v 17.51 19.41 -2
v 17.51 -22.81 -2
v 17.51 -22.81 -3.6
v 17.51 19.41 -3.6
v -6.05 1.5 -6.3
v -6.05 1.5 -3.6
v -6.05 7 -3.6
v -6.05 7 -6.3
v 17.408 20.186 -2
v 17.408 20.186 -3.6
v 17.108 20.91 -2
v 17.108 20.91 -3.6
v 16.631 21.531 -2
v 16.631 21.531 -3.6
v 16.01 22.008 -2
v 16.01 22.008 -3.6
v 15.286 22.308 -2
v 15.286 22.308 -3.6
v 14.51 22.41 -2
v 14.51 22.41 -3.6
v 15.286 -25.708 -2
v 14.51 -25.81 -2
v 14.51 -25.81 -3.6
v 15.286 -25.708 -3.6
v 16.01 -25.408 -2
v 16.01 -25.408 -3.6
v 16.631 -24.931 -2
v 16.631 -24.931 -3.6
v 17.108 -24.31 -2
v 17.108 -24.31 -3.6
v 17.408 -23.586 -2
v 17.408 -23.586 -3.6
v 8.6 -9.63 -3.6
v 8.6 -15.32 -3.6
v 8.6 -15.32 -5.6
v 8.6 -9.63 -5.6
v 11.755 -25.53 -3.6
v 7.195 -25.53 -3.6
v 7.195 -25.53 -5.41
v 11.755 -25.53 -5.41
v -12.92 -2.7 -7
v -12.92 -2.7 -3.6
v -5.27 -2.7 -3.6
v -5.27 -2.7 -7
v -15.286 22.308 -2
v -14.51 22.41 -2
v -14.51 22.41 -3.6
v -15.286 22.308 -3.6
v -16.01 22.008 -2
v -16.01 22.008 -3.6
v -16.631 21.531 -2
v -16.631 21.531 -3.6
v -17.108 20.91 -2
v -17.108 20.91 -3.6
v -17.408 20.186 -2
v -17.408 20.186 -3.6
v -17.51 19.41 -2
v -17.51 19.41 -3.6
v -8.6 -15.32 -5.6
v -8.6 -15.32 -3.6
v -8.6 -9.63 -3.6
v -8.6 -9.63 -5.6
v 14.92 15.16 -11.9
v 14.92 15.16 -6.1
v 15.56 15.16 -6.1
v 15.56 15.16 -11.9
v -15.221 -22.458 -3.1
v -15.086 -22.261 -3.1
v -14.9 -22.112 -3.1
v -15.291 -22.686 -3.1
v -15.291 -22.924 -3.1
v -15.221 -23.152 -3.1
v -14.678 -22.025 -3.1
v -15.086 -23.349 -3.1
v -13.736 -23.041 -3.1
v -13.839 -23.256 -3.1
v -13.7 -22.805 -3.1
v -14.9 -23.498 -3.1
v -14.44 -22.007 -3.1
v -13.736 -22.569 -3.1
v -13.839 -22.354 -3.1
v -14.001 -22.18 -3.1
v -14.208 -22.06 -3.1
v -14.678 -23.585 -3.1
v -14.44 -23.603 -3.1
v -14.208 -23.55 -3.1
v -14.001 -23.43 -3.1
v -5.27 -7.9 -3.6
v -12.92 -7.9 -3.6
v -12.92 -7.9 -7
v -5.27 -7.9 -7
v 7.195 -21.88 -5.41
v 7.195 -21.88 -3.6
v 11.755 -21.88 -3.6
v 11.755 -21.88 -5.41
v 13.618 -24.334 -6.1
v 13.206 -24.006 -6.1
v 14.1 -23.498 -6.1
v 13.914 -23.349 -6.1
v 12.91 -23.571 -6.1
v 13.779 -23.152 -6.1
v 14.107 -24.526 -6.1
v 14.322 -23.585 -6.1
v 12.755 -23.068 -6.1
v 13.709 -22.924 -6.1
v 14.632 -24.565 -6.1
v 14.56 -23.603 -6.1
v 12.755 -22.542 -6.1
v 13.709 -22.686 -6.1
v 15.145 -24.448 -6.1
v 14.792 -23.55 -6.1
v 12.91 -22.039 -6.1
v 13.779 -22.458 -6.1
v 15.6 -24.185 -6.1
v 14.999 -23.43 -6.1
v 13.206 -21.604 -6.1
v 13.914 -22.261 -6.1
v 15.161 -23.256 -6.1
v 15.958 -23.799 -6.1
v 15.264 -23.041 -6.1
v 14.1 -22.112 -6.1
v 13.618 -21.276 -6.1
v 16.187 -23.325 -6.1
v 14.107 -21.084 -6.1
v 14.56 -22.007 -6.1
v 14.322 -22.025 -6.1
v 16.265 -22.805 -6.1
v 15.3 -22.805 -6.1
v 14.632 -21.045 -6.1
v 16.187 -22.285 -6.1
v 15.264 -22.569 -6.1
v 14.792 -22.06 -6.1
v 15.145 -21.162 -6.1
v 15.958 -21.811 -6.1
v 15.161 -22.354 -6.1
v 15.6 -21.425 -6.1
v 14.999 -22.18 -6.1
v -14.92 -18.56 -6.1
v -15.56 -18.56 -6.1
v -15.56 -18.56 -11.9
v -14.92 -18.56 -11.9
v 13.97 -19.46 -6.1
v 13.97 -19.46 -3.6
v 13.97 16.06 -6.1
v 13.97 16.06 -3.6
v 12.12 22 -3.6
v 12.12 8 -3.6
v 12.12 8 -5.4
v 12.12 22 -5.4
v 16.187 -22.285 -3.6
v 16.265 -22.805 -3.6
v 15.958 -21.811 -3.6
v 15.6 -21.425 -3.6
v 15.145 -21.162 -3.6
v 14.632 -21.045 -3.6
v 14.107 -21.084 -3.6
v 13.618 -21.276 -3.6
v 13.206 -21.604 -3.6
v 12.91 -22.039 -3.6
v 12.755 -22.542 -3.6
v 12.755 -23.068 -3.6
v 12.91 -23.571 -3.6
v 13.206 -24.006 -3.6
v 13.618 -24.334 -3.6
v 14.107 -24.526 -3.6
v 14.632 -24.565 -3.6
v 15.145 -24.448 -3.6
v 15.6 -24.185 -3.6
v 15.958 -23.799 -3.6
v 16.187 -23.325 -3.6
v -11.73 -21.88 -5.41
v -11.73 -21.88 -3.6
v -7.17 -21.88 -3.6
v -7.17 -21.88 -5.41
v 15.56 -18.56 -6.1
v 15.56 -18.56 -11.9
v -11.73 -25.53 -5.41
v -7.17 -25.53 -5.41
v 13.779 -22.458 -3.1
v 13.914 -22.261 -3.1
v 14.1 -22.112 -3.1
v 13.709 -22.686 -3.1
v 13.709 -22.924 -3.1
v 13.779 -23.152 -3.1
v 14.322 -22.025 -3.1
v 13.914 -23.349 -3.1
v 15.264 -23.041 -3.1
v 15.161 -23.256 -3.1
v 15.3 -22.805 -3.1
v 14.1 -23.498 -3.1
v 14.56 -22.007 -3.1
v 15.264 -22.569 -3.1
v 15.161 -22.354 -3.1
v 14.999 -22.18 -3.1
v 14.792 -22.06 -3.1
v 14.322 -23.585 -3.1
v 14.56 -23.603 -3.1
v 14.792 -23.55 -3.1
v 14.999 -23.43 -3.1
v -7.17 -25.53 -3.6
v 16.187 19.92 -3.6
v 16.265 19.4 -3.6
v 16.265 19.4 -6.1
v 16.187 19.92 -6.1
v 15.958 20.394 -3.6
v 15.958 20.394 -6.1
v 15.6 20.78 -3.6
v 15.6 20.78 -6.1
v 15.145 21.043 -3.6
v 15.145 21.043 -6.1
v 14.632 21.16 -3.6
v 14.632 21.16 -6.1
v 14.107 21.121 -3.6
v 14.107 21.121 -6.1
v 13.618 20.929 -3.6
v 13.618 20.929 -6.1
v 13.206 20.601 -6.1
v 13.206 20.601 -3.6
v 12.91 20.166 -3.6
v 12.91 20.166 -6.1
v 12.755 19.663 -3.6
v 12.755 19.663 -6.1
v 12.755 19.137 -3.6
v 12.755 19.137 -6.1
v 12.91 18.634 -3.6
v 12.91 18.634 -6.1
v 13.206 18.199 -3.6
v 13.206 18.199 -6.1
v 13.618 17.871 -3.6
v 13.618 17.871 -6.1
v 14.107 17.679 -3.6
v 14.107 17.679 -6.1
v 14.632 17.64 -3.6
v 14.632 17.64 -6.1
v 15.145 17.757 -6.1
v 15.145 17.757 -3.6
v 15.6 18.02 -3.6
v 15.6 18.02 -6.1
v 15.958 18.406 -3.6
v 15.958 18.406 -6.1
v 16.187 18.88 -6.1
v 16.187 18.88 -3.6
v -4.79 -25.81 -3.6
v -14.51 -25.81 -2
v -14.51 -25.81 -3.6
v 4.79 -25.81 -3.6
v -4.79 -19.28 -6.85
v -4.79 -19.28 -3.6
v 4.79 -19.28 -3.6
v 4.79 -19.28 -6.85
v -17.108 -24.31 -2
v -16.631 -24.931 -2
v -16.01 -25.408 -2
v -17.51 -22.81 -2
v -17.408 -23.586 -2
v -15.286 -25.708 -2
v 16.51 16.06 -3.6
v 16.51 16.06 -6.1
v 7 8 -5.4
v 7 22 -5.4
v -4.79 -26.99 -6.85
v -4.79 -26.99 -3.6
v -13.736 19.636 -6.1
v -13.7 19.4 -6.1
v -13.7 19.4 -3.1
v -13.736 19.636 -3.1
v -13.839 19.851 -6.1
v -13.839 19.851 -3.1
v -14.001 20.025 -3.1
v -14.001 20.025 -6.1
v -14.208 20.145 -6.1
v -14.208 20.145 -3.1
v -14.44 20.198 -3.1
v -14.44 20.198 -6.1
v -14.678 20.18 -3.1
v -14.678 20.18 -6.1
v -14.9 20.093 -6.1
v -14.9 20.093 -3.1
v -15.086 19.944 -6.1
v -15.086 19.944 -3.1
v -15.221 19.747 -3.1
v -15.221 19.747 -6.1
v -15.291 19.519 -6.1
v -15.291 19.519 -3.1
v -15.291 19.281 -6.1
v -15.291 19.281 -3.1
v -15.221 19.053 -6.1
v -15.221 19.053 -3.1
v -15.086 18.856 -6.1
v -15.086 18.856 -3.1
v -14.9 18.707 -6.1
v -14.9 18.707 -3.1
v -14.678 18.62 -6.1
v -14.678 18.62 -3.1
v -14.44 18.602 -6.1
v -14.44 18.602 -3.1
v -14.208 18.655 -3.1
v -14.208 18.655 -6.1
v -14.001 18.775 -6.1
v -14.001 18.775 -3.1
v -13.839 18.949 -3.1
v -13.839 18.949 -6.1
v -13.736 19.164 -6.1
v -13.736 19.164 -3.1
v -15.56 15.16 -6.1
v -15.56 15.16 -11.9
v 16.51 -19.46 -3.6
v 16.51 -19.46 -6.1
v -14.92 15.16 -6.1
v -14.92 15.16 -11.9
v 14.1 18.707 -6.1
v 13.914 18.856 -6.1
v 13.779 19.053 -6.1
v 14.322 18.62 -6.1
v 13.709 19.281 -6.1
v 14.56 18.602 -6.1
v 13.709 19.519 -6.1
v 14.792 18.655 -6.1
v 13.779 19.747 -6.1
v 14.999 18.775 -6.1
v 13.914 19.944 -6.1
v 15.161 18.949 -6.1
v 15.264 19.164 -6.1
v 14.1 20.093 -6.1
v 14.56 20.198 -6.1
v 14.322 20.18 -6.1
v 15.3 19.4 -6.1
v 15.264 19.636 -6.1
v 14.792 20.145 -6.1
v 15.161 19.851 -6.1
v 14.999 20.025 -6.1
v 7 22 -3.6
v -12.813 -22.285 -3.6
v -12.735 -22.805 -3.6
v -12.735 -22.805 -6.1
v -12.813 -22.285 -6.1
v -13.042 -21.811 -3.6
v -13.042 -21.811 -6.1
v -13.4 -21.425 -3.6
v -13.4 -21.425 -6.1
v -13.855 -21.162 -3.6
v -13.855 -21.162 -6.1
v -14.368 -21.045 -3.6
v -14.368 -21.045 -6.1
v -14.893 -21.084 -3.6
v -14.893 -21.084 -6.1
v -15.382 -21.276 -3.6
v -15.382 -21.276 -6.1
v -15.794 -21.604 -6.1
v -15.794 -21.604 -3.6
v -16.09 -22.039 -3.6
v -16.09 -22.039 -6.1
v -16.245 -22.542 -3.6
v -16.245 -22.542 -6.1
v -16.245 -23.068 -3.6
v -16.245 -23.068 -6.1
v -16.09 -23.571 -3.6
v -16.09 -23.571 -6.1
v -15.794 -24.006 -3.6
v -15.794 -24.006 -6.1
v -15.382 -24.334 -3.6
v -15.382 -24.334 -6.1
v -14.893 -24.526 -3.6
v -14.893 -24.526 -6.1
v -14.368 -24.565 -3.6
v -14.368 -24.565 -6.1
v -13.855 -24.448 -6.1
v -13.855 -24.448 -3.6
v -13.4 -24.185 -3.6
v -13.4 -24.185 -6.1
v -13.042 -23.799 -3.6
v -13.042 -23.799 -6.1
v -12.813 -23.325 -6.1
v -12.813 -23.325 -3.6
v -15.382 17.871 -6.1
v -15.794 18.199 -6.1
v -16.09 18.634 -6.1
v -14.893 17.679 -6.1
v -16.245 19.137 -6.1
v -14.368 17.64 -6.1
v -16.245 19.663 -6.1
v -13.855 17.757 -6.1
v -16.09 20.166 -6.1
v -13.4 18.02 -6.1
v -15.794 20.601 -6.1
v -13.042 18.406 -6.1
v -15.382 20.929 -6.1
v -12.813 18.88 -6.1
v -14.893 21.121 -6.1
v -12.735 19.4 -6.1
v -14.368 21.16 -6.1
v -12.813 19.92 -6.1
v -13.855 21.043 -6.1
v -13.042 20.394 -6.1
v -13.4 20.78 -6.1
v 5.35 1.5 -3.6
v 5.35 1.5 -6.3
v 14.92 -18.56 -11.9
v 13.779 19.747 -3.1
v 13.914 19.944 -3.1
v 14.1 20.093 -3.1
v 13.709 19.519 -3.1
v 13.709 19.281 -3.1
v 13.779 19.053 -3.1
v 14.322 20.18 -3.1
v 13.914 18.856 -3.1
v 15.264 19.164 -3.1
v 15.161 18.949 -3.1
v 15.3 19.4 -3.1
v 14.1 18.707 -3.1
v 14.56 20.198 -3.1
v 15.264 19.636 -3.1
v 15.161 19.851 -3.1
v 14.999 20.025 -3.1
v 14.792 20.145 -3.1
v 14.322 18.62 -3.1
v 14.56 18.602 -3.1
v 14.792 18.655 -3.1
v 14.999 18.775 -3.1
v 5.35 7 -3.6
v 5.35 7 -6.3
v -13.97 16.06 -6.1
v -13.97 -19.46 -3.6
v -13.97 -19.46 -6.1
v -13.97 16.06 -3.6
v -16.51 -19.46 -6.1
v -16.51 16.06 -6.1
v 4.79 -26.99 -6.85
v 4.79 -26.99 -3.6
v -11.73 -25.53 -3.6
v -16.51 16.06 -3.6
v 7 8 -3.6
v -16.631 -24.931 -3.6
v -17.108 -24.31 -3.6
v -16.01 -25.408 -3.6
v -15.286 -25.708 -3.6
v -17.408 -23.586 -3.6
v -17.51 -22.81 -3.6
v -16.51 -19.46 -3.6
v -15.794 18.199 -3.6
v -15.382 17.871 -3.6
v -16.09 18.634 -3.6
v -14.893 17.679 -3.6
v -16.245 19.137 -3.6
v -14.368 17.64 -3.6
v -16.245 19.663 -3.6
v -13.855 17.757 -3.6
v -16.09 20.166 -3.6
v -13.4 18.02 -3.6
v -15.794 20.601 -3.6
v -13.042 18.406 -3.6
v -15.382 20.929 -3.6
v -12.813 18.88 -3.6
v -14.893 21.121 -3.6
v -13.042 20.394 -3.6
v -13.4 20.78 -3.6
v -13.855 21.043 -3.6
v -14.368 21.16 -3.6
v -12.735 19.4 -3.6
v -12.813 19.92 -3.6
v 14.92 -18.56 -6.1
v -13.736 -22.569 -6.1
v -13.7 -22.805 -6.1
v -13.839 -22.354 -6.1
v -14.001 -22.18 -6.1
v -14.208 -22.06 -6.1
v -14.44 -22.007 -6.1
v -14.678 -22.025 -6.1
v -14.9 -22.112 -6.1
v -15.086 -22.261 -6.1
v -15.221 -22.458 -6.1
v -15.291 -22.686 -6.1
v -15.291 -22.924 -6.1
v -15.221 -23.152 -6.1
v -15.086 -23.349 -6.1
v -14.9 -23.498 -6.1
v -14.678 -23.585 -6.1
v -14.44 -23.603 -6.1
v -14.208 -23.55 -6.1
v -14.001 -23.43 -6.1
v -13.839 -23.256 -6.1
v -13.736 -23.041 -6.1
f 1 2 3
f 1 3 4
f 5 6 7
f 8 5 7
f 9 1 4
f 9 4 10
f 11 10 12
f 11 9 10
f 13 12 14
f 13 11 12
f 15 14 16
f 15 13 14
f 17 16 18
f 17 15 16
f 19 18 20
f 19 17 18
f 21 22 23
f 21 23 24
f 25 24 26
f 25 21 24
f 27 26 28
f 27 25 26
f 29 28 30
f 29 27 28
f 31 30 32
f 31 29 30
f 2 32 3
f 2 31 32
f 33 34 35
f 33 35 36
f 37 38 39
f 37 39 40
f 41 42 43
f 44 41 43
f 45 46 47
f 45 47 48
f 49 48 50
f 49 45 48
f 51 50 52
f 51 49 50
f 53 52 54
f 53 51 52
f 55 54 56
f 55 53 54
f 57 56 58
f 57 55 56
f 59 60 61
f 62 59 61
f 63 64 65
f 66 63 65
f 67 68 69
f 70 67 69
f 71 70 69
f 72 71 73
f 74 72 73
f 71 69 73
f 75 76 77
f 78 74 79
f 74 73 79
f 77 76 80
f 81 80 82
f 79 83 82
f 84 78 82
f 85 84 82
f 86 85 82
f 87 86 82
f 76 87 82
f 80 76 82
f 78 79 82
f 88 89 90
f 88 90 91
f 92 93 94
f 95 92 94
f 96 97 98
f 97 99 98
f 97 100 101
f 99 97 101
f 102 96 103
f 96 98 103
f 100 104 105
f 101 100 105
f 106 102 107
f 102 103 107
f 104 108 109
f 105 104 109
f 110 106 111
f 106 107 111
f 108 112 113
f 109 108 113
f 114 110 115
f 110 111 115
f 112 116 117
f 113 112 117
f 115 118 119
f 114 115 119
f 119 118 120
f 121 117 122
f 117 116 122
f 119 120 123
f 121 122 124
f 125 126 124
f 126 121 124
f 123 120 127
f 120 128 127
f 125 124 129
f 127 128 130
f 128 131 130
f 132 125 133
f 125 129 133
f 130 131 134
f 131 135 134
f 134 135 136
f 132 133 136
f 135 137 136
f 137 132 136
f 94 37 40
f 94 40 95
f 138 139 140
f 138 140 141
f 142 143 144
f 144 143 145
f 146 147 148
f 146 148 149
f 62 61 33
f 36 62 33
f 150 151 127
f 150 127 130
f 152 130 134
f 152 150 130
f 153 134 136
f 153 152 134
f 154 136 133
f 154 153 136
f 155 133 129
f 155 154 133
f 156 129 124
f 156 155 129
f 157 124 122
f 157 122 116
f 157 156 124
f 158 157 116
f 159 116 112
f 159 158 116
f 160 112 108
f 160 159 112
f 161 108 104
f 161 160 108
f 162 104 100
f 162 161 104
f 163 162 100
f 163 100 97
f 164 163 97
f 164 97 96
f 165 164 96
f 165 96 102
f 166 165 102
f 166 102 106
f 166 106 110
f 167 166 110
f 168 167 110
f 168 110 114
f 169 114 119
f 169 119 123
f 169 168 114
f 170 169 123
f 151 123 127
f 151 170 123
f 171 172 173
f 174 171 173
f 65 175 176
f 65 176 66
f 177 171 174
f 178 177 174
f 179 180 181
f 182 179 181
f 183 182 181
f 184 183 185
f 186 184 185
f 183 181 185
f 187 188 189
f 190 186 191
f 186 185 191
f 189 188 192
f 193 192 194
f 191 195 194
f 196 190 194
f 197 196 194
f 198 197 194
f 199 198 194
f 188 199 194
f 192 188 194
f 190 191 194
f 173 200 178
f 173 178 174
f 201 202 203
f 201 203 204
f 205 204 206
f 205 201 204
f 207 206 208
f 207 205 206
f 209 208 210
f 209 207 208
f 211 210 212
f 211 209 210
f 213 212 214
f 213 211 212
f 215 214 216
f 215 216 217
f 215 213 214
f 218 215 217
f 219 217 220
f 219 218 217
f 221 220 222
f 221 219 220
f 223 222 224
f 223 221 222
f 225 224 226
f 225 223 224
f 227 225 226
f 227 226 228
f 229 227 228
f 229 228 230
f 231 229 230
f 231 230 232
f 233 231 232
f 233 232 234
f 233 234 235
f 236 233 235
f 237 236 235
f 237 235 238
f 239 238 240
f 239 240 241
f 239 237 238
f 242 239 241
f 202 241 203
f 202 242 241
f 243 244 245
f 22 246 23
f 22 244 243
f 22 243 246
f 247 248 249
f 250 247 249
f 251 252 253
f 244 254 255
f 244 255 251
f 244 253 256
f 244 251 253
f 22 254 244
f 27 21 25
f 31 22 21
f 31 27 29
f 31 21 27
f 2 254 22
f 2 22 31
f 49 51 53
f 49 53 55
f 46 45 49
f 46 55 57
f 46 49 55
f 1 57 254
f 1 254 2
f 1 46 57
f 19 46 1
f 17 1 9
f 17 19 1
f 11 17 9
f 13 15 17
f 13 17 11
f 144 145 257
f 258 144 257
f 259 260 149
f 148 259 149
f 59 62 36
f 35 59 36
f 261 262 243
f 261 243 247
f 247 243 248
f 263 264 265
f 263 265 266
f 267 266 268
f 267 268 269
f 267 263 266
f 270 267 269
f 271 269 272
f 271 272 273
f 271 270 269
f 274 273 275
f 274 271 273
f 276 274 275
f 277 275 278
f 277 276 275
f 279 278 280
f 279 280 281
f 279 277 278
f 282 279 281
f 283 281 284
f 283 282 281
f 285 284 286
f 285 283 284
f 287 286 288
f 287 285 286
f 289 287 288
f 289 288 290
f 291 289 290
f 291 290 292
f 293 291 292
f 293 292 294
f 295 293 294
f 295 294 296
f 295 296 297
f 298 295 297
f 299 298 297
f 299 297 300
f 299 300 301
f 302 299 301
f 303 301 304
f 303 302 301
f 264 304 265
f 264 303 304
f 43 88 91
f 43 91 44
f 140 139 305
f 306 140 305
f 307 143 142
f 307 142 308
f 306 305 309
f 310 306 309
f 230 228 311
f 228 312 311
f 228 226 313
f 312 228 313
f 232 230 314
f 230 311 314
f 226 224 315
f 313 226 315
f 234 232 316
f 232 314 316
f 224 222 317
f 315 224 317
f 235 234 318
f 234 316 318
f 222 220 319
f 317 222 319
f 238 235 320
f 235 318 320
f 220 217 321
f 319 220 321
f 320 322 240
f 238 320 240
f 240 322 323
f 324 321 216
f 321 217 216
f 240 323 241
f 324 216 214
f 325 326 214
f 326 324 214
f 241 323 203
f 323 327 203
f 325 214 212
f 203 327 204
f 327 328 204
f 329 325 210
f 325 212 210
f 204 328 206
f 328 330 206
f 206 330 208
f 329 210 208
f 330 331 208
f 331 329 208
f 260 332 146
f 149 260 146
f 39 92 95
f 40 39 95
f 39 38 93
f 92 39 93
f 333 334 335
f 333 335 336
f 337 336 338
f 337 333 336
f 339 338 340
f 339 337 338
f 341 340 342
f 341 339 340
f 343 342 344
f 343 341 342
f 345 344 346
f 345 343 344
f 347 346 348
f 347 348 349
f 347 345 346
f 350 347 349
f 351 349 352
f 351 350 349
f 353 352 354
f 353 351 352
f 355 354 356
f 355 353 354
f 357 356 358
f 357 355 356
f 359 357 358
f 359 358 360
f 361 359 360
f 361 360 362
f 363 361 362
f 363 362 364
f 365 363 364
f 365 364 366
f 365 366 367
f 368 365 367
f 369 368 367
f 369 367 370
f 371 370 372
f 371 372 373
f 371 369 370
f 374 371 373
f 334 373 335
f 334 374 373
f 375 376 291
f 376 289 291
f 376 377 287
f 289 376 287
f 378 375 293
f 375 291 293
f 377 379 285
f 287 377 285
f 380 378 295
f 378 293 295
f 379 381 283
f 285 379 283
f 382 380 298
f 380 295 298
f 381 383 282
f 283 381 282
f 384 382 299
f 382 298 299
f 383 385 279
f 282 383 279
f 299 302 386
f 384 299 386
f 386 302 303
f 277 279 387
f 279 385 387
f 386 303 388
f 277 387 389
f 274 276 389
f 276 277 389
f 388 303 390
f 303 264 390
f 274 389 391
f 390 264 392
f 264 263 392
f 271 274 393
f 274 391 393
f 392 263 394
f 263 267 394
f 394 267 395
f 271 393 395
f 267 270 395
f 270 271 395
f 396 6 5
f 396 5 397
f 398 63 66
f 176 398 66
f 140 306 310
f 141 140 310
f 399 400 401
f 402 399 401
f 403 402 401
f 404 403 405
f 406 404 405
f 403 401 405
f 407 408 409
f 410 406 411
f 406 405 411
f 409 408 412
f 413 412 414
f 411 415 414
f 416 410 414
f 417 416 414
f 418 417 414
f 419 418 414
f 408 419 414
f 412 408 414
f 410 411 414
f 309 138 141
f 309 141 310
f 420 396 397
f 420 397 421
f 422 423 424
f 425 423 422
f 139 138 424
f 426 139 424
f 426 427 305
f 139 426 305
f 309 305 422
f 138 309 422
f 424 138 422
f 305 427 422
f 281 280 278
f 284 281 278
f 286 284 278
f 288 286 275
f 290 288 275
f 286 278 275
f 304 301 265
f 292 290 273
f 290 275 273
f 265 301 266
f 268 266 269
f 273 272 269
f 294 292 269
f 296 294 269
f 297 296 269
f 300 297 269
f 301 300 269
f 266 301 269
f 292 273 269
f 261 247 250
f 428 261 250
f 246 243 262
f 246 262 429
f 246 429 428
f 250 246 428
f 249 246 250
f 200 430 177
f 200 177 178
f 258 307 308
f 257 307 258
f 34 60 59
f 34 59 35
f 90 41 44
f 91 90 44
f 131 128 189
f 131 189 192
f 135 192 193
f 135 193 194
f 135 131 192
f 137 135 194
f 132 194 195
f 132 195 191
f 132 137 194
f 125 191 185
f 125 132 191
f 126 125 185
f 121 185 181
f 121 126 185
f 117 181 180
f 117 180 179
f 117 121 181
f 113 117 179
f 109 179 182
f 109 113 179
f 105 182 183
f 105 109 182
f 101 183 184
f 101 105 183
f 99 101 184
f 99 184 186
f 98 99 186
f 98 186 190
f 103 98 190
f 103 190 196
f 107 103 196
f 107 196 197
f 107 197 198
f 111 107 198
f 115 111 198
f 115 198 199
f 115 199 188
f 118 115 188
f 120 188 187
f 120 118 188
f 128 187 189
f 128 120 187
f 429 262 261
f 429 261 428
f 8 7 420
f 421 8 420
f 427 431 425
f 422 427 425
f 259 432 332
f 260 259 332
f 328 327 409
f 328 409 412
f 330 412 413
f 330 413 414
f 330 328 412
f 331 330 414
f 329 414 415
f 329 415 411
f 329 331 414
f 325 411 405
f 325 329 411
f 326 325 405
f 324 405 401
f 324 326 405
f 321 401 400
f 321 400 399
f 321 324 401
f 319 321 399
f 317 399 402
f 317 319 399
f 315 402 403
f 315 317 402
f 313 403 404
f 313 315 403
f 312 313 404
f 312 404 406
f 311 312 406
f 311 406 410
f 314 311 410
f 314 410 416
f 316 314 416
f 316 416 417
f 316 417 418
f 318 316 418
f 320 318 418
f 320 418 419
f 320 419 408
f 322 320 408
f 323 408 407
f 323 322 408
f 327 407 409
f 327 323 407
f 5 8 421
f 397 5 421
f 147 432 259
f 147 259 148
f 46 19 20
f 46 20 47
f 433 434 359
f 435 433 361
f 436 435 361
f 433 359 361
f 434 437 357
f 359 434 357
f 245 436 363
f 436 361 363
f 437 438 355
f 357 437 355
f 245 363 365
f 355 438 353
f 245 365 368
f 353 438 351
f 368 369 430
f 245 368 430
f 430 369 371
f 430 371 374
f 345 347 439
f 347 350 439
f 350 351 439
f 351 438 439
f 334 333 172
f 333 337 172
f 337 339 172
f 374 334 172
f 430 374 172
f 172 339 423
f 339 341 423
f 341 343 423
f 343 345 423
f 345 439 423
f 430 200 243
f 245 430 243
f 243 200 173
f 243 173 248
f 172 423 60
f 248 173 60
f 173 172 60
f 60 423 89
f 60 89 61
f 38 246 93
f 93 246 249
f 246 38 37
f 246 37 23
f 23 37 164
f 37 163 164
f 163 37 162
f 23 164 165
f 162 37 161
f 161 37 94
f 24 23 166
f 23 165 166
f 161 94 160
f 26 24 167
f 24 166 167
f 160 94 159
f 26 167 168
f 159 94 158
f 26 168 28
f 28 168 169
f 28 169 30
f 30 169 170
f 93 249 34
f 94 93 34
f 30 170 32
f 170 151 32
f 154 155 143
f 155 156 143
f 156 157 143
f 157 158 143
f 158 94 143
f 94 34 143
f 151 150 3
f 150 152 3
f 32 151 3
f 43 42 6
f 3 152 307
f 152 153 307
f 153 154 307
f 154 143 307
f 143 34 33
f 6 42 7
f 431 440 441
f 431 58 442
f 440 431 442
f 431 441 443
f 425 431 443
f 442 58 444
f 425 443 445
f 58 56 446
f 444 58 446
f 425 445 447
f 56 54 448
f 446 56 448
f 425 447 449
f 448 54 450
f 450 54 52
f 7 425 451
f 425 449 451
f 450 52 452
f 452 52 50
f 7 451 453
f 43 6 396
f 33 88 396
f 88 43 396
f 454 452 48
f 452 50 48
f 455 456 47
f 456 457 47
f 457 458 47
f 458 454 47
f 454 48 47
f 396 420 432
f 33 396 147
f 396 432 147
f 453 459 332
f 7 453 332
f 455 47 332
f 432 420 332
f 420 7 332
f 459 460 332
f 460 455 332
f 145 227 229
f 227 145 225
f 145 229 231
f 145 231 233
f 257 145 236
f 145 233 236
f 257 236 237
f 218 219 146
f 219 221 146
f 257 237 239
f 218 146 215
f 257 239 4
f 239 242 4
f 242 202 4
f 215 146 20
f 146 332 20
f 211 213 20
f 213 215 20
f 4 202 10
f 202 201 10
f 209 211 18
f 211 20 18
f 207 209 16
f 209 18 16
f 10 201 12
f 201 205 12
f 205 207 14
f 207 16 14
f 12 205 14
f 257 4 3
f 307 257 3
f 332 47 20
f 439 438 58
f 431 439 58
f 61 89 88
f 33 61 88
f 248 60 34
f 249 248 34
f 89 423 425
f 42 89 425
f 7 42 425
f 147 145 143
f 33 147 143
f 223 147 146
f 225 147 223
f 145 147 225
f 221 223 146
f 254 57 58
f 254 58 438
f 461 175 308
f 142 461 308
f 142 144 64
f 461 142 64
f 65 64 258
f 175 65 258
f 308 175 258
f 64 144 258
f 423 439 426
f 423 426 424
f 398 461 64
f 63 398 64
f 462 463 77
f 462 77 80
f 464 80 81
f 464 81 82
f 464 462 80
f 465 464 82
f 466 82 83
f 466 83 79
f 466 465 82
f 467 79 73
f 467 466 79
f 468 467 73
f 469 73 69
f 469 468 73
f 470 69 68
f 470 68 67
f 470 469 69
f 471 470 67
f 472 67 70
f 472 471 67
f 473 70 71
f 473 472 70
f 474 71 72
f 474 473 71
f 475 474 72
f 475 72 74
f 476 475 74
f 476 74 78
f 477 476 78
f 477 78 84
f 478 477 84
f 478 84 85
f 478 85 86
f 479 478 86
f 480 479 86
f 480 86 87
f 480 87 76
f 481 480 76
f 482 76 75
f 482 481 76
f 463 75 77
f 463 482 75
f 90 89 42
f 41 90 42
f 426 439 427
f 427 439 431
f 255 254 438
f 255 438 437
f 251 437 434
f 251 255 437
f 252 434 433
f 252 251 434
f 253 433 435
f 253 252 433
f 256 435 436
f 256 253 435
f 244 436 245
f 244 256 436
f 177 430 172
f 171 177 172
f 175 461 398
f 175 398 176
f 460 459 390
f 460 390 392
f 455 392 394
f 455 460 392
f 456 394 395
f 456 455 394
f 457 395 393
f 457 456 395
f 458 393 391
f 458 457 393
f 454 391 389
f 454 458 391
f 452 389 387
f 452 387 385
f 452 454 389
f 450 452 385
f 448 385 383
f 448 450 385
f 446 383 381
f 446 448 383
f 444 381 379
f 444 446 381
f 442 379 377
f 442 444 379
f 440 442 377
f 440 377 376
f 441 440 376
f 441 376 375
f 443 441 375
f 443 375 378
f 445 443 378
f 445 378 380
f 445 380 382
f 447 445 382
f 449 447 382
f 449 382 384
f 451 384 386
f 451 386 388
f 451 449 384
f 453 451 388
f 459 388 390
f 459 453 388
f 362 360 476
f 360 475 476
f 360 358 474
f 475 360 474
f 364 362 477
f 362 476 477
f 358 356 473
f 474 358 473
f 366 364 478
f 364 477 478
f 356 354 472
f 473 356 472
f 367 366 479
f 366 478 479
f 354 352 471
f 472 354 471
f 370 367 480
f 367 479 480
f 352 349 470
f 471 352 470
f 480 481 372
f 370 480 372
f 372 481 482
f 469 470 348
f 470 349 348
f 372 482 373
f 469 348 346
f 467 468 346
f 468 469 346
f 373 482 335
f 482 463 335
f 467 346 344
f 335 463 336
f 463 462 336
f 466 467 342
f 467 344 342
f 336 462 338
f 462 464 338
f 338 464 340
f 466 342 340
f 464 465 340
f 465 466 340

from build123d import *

# Parameters (mm, degrees)
PCB_DEPTH         = 1.6
HEADER_BODY_SK2_W = 2.54
HEADER_BODY_SK2_H = 35.52
HEADER_BODY_DEPTH = 2.5
HEADER_PINS_SK3_W = 0.64
HEADER_PINS_SK3_H = 33.72
HEADER_PINS_DEPTH = 5.8
STANDOFFS_SK4_R   = 1.765
STANDOFFS_DEPTH   = 2.5
M2_BORE_SK5_R     = 0.8
M2_BORE_DEPTH     = 3
USB_C_SK6_W       = 9.58
USB_C_SK6_H       = 7.71
USB_C_DEPTH       = 3.25
KEYS_SK7_W        = 4.56
KEYS_SK7_H        = 3.65
KEYS_DEPTH        = 1.81
CAM_FPC_SK8_W     = 17.2
CAM_FPC_SK8_H     = 5.69
CAM_FPC_DEPTH     = 2
BAT_CONN_SK9_W    = 7.65
BAT_CONN_SK9_H    = 5.2
BAT_CONN_DEPTH    = 3.4
TF_SLOT_SK10_W    = 11.4
TF_SLOT_SK10_H    = 5.5
TF_SLOT_DEPTH     = 2.7
ESP32_S3_SK11_W   = 5.12
ESP32_S3_SK11_H   = 14
ESP32_S3_DEPTH    = 1.8


with BuildPart() as part:
    # PCB_Sk1 → PCB (new body)
    with BuildSketch(Plane.XY.offset(-2)):
        with BuildLine():
            Line((-14.51, -25.81), (14.51, -25.81))
            ThreePointArc((14.51, -25.81), (16.631320344, -24.931320344), (17.51, -22.81))
            Line((17.51, -22.81), (17.51, 19.41))
            ThreePointArc((17.51, 19.41), (16.631320344, 21.531320344), (14.51, 22.41))
            Line((14.51, 22.41), (-14.51, 22.41))
            ThreePointArc((-14.51, 22.41), (-16.631320344, 21.531320344), (-17.51, 19.41))
            Line((-17.51, 19.41), (-17.51, -22.81))
            ThreePointArc((-17.51, -22.81), (-16.631320344, -24.931320344), (-14.51, -25.81))
        make_face()
    extrude(amount=-PCB_DEPTH)

    # Header_Body_Sk2 → Header_Body (add)
    with BuildSketch(Plane.XY.offset(-3.6)):
        with Locations((15.24, -1.7)):
            Rectangle(HEADER_BODY_SK2_W, HEADER_BODY_SK2_H)
        with Locations((-15.24, -1.7)):
            Rectangle(HEADER_BODY_SK2_W, HEADER_BODY_SK2_H)
    extrude(amount=-HEADER_BODY_DEPTH)

    # Header_Pins_Sk3 → Header_Pins (add)
    with BuildSketch(Plane.XY.offset(-6.1)):
        with Locations((15.24, -1.7)):
            Rectangle(HEADER_PINS_SK3_W, HEADER_PINS_SK3_H)
        with Locations((-15.24, -1.7)):
            Rectangle(HEADER_PINS_SK3_W, HEADER_PINS_SK3_H)
    extrude(amount=-HEADER_PINS_DEPTH)

    # Standoffs_Sk4 → Standoffs (add)
    with BuildSketch(Plane.XY.offset(-3.6)):
        with Locations((14.5, 19.4)):
            Circle(STANDOFFS_SK4_R)
        with Locations((-14.5, 19.4)):
            Circle(STANDOFFS_SK4_R)
        with Locations((14.5, -22.805)):
            Circle(STANDOFFS_SK4_R)
        with Locations((-14.5, -22.805)):
            Circle(STANDOFFS_SK4_R)
    extrude(amount=-STANDOFFS_DEPTH)

    # M2_Bore_Sk5 → M2_Bore (cut)
    with BuildSketch(Plane.XY.offset(-6.1)):
        with Locations((14.5, 19.4)):
            Circle(M2_BORE_SK5_R)
        with Locations((-14.5, 19.4)):
            Circle(M2_BORE_SK5_R)
        with Locations((14.5, -22.805)):
            Circle(M2_BORE_SK5_R)
        with Locations((-14.5, -22.805)):
            Circle(M2_BORE_SK5_R)
    extrude(amount=M2_BORE_DEPTH, mode=Mode.SUBTRACT)

    # USB_C_Sk6 → USB_C (add)
    with BuildSketch(Plane.XY.offset(-3.6)):
        with Locations((0, -23.135)):
            Rectangle(USB_C_SK6_W, USB_C_SK6_H)
    extrude(amount=-USB_C_DEPTH)

    # Keys_Sk7 → Keys (add)
    with BuildSketch(Plane.XY.offset(-3.6)):
        with Locations((9.475, -23.705)):
            Rectangle(KEYS_SK7_W, KEYS_SK7_H)
        with Locations((-9.45, -23.705)):
            Rectangle(KEYS_SK7_W, KEYS_SK7_H)
    extrude(amount=-KEYS_DEPTH)

    # Cam_FPC_Sk8 → Cam_FPC (add)
    with BuildSketch(Plane.XY.offset(-3.6)):
        with Locations((0, -12.475)):
            Rectangle(CAM_FPC_SK8_W, CAM_FPC_SK8_H)
    extrude(amount=-CAM_FPC_DEPTH)

    # Bat_Conn_Sk9 → Bat_Conn (add)
    with BuildSketch(Plane.XY.offset(-3.6)):
        with Locations((-9.095, -5.3)):
            Rectangle(BAT_CONN_SK9_W, BAT_CONN_SK9_H)
    extrude(amount=-BAT_CONN_DEPTH)

    # TF_Slot_Sk10 → TF_Slot (add)
    with BuildSketch(Plane.XY.offset(-3.6)):
        with Locations((-0.35, 4.25)):
            Rectangle(TF_SLOT_SK10_W, TF_SLOT_SK10_H)
    extrude(amount=-TF_SLOT_DEPTH)

    # ESP32_S3_Sk11 → ESP32_S3 (add)
    with BuildSketch(Plane.XY.offset(-3.6)):
        with Locations((9.56, 15)):
            Rectangle(ESP32_S3_SK11_W, ESP32_S3_SK11_H)
    extrude(amount=-ESP32_S3_DEPTH)


solid = part.part
